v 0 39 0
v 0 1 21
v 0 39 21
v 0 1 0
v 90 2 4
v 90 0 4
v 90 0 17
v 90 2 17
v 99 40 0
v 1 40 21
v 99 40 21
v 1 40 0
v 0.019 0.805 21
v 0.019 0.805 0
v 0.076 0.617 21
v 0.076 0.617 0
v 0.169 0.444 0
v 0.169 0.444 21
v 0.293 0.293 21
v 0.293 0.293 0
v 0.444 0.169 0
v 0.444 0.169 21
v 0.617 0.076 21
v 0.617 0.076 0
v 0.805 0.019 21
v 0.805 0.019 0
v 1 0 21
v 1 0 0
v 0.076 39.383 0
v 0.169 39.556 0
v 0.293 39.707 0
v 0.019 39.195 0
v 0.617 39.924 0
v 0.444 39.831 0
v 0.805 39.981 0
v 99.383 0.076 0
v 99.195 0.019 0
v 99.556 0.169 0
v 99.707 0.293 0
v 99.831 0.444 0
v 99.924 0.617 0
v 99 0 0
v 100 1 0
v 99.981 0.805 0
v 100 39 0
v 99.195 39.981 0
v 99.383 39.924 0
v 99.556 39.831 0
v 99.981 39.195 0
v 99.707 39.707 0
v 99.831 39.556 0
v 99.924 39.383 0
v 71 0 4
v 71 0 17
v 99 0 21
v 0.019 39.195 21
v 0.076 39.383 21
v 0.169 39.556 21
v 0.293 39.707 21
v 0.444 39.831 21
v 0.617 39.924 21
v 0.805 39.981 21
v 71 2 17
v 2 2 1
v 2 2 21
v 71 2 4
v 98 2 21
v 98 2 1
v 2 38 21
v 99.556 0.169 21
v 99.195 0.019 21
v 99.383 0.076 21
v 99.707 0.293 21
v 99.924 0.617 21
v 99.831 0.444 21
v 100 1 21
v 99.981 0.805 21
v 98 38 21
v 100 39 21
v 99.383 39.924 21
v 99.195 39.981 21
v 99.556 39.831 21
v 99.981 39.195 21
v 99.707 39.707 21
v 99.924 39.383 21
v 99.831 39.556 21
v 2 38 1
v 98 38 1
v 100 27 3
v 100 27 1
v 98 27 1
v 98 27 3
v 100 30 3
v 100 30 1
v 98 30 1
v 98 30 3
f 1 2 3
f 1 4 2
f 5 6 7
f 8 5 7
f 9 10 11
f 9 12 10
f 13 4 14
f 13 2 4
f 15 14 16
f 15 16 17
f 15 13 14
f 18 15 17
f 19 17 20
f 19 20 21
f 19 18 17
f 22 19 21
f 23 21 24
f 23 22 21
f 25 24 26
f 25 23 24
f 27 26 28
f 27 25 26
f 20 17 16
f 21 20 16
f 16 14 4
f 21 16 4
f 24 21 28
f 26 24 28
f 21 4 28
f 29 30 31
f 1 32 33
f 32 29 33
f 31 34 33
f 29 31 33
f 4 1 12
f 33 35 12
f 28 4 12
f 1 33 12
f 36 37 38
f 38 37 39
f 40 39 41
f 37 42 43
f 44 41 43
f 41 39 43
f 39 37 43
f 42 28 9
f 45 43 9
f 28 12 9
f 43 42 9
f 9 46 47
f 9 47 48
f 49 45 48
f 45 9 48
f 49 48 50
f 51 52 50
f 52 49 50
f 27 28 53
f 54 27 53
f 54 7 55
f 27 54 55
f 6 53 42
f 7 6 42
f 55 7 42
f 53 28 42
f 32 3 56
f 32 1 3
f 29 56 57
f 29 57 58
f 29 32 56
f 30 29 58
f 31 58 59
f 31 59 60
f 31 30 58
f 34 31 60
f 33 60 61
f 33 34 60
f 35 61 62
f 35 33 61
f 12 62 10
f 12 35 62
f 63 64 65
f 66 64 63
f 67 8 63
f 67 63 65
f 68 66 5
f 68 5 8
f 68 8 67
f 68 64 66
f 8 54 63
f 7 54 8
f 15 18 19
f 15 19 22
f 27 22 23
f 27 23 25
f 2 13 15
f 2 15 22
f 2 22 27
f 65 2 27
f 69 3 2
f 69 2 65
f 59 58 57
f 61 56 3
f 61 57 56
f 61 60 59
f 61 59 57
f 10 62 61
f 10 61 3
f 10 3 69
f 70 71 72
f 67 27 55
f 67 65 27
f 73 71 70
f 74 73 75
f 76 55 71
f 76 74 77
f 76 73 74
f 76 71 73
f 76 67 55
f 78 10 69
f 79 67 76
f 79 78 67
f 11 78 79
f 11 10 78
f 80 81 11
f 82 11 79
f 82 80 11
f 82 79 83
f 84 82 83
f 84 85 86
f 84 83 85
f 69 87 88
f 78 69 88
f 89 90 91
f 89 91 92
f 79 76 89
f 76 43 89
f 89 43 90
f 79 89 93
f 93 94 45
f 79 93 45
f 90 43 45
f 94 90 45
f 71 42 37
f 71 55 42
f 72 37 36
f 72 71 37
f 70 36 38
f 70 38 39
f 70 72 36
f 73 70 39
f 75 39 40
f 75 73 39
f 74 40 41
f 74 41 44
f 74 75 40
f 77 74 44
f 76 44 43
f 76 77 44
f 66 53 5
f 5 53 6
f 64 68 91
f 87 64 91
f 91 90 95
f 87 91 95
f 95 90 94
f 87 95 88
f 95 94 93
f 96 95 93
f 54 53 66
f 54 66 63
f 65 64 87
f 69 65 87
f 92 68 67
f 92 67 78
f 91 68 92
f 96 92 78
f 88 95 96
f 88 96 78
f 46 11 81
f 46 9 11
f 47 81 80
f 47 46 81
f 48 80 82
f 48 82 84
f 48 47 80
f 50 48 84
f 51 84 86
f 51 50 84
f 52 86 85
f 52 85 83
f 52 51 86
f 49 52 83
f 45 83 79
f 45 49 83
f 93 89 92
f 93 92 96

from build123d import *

# Parameters (mm, degrees)
F0_W     = 100
F0_H     = 40
F1_DEPTH = 1
F2_W     = 100
F2_H     = 40
F2_W_2   = 96
F2_H_2   = 36
F3_DEPTH = 20
F4_W     = 3
F4_H     = 2
F5_DEPTH = 25
F6_W     = 19
F6_H     = 13
F7_DEPTH = 25
F8_R     = 1


with BuildPart() as f1:
    # F0 (on Top) → F1 (new body)
    with BuildSketch(Plane.XY):
        with Locations((50, 20)):
            Rectangle(F0_W, F0_H)
    extrude(amount=F1_DEPTH)

    # F2 (on face) → F3 (join)
    with BuildSketch(Plane.XY.offset(1)):
        with Locations((50, 20)):
            Rectangle(F2_W, F2_H)
        with Locations((50, 20)):
            Rectangle(F2_W_2, F2_H_2, mode=Mode.SUBTRACT)
    extrude(amount=F3_DEPTH)

    # F4 (on face) → F5 (cut)
    with BuildSketch(Plane.YZ.offset(100)):
        with Locations((28.5, 2)):
            Rectangle(F4_W, F4_H)
    extrude(amount=-F5_DEPTH, mode=Mode.SUBTRACT)

    # F6 (on face) → F7 (cut)
    with BuildSketch(Plane.XZ):
        with Locations((80.5, 10.5)):
            Rectangle(F6_W, F6_H)
    extrude(amount=-F7_DEPTH, mode=Mode.SUBTRACT)

    # F8
    f8_edges = [f1.edges().sort_by_distance(p)[0] for p in [
        (0, 0, 10.5),
        (100, 0, 10.5),
        (100, 40, 10.5),
        (0, 40, 10.5),
    ]]
    fillet(f8_edges, radius=F8_R)


solid = f1.part
